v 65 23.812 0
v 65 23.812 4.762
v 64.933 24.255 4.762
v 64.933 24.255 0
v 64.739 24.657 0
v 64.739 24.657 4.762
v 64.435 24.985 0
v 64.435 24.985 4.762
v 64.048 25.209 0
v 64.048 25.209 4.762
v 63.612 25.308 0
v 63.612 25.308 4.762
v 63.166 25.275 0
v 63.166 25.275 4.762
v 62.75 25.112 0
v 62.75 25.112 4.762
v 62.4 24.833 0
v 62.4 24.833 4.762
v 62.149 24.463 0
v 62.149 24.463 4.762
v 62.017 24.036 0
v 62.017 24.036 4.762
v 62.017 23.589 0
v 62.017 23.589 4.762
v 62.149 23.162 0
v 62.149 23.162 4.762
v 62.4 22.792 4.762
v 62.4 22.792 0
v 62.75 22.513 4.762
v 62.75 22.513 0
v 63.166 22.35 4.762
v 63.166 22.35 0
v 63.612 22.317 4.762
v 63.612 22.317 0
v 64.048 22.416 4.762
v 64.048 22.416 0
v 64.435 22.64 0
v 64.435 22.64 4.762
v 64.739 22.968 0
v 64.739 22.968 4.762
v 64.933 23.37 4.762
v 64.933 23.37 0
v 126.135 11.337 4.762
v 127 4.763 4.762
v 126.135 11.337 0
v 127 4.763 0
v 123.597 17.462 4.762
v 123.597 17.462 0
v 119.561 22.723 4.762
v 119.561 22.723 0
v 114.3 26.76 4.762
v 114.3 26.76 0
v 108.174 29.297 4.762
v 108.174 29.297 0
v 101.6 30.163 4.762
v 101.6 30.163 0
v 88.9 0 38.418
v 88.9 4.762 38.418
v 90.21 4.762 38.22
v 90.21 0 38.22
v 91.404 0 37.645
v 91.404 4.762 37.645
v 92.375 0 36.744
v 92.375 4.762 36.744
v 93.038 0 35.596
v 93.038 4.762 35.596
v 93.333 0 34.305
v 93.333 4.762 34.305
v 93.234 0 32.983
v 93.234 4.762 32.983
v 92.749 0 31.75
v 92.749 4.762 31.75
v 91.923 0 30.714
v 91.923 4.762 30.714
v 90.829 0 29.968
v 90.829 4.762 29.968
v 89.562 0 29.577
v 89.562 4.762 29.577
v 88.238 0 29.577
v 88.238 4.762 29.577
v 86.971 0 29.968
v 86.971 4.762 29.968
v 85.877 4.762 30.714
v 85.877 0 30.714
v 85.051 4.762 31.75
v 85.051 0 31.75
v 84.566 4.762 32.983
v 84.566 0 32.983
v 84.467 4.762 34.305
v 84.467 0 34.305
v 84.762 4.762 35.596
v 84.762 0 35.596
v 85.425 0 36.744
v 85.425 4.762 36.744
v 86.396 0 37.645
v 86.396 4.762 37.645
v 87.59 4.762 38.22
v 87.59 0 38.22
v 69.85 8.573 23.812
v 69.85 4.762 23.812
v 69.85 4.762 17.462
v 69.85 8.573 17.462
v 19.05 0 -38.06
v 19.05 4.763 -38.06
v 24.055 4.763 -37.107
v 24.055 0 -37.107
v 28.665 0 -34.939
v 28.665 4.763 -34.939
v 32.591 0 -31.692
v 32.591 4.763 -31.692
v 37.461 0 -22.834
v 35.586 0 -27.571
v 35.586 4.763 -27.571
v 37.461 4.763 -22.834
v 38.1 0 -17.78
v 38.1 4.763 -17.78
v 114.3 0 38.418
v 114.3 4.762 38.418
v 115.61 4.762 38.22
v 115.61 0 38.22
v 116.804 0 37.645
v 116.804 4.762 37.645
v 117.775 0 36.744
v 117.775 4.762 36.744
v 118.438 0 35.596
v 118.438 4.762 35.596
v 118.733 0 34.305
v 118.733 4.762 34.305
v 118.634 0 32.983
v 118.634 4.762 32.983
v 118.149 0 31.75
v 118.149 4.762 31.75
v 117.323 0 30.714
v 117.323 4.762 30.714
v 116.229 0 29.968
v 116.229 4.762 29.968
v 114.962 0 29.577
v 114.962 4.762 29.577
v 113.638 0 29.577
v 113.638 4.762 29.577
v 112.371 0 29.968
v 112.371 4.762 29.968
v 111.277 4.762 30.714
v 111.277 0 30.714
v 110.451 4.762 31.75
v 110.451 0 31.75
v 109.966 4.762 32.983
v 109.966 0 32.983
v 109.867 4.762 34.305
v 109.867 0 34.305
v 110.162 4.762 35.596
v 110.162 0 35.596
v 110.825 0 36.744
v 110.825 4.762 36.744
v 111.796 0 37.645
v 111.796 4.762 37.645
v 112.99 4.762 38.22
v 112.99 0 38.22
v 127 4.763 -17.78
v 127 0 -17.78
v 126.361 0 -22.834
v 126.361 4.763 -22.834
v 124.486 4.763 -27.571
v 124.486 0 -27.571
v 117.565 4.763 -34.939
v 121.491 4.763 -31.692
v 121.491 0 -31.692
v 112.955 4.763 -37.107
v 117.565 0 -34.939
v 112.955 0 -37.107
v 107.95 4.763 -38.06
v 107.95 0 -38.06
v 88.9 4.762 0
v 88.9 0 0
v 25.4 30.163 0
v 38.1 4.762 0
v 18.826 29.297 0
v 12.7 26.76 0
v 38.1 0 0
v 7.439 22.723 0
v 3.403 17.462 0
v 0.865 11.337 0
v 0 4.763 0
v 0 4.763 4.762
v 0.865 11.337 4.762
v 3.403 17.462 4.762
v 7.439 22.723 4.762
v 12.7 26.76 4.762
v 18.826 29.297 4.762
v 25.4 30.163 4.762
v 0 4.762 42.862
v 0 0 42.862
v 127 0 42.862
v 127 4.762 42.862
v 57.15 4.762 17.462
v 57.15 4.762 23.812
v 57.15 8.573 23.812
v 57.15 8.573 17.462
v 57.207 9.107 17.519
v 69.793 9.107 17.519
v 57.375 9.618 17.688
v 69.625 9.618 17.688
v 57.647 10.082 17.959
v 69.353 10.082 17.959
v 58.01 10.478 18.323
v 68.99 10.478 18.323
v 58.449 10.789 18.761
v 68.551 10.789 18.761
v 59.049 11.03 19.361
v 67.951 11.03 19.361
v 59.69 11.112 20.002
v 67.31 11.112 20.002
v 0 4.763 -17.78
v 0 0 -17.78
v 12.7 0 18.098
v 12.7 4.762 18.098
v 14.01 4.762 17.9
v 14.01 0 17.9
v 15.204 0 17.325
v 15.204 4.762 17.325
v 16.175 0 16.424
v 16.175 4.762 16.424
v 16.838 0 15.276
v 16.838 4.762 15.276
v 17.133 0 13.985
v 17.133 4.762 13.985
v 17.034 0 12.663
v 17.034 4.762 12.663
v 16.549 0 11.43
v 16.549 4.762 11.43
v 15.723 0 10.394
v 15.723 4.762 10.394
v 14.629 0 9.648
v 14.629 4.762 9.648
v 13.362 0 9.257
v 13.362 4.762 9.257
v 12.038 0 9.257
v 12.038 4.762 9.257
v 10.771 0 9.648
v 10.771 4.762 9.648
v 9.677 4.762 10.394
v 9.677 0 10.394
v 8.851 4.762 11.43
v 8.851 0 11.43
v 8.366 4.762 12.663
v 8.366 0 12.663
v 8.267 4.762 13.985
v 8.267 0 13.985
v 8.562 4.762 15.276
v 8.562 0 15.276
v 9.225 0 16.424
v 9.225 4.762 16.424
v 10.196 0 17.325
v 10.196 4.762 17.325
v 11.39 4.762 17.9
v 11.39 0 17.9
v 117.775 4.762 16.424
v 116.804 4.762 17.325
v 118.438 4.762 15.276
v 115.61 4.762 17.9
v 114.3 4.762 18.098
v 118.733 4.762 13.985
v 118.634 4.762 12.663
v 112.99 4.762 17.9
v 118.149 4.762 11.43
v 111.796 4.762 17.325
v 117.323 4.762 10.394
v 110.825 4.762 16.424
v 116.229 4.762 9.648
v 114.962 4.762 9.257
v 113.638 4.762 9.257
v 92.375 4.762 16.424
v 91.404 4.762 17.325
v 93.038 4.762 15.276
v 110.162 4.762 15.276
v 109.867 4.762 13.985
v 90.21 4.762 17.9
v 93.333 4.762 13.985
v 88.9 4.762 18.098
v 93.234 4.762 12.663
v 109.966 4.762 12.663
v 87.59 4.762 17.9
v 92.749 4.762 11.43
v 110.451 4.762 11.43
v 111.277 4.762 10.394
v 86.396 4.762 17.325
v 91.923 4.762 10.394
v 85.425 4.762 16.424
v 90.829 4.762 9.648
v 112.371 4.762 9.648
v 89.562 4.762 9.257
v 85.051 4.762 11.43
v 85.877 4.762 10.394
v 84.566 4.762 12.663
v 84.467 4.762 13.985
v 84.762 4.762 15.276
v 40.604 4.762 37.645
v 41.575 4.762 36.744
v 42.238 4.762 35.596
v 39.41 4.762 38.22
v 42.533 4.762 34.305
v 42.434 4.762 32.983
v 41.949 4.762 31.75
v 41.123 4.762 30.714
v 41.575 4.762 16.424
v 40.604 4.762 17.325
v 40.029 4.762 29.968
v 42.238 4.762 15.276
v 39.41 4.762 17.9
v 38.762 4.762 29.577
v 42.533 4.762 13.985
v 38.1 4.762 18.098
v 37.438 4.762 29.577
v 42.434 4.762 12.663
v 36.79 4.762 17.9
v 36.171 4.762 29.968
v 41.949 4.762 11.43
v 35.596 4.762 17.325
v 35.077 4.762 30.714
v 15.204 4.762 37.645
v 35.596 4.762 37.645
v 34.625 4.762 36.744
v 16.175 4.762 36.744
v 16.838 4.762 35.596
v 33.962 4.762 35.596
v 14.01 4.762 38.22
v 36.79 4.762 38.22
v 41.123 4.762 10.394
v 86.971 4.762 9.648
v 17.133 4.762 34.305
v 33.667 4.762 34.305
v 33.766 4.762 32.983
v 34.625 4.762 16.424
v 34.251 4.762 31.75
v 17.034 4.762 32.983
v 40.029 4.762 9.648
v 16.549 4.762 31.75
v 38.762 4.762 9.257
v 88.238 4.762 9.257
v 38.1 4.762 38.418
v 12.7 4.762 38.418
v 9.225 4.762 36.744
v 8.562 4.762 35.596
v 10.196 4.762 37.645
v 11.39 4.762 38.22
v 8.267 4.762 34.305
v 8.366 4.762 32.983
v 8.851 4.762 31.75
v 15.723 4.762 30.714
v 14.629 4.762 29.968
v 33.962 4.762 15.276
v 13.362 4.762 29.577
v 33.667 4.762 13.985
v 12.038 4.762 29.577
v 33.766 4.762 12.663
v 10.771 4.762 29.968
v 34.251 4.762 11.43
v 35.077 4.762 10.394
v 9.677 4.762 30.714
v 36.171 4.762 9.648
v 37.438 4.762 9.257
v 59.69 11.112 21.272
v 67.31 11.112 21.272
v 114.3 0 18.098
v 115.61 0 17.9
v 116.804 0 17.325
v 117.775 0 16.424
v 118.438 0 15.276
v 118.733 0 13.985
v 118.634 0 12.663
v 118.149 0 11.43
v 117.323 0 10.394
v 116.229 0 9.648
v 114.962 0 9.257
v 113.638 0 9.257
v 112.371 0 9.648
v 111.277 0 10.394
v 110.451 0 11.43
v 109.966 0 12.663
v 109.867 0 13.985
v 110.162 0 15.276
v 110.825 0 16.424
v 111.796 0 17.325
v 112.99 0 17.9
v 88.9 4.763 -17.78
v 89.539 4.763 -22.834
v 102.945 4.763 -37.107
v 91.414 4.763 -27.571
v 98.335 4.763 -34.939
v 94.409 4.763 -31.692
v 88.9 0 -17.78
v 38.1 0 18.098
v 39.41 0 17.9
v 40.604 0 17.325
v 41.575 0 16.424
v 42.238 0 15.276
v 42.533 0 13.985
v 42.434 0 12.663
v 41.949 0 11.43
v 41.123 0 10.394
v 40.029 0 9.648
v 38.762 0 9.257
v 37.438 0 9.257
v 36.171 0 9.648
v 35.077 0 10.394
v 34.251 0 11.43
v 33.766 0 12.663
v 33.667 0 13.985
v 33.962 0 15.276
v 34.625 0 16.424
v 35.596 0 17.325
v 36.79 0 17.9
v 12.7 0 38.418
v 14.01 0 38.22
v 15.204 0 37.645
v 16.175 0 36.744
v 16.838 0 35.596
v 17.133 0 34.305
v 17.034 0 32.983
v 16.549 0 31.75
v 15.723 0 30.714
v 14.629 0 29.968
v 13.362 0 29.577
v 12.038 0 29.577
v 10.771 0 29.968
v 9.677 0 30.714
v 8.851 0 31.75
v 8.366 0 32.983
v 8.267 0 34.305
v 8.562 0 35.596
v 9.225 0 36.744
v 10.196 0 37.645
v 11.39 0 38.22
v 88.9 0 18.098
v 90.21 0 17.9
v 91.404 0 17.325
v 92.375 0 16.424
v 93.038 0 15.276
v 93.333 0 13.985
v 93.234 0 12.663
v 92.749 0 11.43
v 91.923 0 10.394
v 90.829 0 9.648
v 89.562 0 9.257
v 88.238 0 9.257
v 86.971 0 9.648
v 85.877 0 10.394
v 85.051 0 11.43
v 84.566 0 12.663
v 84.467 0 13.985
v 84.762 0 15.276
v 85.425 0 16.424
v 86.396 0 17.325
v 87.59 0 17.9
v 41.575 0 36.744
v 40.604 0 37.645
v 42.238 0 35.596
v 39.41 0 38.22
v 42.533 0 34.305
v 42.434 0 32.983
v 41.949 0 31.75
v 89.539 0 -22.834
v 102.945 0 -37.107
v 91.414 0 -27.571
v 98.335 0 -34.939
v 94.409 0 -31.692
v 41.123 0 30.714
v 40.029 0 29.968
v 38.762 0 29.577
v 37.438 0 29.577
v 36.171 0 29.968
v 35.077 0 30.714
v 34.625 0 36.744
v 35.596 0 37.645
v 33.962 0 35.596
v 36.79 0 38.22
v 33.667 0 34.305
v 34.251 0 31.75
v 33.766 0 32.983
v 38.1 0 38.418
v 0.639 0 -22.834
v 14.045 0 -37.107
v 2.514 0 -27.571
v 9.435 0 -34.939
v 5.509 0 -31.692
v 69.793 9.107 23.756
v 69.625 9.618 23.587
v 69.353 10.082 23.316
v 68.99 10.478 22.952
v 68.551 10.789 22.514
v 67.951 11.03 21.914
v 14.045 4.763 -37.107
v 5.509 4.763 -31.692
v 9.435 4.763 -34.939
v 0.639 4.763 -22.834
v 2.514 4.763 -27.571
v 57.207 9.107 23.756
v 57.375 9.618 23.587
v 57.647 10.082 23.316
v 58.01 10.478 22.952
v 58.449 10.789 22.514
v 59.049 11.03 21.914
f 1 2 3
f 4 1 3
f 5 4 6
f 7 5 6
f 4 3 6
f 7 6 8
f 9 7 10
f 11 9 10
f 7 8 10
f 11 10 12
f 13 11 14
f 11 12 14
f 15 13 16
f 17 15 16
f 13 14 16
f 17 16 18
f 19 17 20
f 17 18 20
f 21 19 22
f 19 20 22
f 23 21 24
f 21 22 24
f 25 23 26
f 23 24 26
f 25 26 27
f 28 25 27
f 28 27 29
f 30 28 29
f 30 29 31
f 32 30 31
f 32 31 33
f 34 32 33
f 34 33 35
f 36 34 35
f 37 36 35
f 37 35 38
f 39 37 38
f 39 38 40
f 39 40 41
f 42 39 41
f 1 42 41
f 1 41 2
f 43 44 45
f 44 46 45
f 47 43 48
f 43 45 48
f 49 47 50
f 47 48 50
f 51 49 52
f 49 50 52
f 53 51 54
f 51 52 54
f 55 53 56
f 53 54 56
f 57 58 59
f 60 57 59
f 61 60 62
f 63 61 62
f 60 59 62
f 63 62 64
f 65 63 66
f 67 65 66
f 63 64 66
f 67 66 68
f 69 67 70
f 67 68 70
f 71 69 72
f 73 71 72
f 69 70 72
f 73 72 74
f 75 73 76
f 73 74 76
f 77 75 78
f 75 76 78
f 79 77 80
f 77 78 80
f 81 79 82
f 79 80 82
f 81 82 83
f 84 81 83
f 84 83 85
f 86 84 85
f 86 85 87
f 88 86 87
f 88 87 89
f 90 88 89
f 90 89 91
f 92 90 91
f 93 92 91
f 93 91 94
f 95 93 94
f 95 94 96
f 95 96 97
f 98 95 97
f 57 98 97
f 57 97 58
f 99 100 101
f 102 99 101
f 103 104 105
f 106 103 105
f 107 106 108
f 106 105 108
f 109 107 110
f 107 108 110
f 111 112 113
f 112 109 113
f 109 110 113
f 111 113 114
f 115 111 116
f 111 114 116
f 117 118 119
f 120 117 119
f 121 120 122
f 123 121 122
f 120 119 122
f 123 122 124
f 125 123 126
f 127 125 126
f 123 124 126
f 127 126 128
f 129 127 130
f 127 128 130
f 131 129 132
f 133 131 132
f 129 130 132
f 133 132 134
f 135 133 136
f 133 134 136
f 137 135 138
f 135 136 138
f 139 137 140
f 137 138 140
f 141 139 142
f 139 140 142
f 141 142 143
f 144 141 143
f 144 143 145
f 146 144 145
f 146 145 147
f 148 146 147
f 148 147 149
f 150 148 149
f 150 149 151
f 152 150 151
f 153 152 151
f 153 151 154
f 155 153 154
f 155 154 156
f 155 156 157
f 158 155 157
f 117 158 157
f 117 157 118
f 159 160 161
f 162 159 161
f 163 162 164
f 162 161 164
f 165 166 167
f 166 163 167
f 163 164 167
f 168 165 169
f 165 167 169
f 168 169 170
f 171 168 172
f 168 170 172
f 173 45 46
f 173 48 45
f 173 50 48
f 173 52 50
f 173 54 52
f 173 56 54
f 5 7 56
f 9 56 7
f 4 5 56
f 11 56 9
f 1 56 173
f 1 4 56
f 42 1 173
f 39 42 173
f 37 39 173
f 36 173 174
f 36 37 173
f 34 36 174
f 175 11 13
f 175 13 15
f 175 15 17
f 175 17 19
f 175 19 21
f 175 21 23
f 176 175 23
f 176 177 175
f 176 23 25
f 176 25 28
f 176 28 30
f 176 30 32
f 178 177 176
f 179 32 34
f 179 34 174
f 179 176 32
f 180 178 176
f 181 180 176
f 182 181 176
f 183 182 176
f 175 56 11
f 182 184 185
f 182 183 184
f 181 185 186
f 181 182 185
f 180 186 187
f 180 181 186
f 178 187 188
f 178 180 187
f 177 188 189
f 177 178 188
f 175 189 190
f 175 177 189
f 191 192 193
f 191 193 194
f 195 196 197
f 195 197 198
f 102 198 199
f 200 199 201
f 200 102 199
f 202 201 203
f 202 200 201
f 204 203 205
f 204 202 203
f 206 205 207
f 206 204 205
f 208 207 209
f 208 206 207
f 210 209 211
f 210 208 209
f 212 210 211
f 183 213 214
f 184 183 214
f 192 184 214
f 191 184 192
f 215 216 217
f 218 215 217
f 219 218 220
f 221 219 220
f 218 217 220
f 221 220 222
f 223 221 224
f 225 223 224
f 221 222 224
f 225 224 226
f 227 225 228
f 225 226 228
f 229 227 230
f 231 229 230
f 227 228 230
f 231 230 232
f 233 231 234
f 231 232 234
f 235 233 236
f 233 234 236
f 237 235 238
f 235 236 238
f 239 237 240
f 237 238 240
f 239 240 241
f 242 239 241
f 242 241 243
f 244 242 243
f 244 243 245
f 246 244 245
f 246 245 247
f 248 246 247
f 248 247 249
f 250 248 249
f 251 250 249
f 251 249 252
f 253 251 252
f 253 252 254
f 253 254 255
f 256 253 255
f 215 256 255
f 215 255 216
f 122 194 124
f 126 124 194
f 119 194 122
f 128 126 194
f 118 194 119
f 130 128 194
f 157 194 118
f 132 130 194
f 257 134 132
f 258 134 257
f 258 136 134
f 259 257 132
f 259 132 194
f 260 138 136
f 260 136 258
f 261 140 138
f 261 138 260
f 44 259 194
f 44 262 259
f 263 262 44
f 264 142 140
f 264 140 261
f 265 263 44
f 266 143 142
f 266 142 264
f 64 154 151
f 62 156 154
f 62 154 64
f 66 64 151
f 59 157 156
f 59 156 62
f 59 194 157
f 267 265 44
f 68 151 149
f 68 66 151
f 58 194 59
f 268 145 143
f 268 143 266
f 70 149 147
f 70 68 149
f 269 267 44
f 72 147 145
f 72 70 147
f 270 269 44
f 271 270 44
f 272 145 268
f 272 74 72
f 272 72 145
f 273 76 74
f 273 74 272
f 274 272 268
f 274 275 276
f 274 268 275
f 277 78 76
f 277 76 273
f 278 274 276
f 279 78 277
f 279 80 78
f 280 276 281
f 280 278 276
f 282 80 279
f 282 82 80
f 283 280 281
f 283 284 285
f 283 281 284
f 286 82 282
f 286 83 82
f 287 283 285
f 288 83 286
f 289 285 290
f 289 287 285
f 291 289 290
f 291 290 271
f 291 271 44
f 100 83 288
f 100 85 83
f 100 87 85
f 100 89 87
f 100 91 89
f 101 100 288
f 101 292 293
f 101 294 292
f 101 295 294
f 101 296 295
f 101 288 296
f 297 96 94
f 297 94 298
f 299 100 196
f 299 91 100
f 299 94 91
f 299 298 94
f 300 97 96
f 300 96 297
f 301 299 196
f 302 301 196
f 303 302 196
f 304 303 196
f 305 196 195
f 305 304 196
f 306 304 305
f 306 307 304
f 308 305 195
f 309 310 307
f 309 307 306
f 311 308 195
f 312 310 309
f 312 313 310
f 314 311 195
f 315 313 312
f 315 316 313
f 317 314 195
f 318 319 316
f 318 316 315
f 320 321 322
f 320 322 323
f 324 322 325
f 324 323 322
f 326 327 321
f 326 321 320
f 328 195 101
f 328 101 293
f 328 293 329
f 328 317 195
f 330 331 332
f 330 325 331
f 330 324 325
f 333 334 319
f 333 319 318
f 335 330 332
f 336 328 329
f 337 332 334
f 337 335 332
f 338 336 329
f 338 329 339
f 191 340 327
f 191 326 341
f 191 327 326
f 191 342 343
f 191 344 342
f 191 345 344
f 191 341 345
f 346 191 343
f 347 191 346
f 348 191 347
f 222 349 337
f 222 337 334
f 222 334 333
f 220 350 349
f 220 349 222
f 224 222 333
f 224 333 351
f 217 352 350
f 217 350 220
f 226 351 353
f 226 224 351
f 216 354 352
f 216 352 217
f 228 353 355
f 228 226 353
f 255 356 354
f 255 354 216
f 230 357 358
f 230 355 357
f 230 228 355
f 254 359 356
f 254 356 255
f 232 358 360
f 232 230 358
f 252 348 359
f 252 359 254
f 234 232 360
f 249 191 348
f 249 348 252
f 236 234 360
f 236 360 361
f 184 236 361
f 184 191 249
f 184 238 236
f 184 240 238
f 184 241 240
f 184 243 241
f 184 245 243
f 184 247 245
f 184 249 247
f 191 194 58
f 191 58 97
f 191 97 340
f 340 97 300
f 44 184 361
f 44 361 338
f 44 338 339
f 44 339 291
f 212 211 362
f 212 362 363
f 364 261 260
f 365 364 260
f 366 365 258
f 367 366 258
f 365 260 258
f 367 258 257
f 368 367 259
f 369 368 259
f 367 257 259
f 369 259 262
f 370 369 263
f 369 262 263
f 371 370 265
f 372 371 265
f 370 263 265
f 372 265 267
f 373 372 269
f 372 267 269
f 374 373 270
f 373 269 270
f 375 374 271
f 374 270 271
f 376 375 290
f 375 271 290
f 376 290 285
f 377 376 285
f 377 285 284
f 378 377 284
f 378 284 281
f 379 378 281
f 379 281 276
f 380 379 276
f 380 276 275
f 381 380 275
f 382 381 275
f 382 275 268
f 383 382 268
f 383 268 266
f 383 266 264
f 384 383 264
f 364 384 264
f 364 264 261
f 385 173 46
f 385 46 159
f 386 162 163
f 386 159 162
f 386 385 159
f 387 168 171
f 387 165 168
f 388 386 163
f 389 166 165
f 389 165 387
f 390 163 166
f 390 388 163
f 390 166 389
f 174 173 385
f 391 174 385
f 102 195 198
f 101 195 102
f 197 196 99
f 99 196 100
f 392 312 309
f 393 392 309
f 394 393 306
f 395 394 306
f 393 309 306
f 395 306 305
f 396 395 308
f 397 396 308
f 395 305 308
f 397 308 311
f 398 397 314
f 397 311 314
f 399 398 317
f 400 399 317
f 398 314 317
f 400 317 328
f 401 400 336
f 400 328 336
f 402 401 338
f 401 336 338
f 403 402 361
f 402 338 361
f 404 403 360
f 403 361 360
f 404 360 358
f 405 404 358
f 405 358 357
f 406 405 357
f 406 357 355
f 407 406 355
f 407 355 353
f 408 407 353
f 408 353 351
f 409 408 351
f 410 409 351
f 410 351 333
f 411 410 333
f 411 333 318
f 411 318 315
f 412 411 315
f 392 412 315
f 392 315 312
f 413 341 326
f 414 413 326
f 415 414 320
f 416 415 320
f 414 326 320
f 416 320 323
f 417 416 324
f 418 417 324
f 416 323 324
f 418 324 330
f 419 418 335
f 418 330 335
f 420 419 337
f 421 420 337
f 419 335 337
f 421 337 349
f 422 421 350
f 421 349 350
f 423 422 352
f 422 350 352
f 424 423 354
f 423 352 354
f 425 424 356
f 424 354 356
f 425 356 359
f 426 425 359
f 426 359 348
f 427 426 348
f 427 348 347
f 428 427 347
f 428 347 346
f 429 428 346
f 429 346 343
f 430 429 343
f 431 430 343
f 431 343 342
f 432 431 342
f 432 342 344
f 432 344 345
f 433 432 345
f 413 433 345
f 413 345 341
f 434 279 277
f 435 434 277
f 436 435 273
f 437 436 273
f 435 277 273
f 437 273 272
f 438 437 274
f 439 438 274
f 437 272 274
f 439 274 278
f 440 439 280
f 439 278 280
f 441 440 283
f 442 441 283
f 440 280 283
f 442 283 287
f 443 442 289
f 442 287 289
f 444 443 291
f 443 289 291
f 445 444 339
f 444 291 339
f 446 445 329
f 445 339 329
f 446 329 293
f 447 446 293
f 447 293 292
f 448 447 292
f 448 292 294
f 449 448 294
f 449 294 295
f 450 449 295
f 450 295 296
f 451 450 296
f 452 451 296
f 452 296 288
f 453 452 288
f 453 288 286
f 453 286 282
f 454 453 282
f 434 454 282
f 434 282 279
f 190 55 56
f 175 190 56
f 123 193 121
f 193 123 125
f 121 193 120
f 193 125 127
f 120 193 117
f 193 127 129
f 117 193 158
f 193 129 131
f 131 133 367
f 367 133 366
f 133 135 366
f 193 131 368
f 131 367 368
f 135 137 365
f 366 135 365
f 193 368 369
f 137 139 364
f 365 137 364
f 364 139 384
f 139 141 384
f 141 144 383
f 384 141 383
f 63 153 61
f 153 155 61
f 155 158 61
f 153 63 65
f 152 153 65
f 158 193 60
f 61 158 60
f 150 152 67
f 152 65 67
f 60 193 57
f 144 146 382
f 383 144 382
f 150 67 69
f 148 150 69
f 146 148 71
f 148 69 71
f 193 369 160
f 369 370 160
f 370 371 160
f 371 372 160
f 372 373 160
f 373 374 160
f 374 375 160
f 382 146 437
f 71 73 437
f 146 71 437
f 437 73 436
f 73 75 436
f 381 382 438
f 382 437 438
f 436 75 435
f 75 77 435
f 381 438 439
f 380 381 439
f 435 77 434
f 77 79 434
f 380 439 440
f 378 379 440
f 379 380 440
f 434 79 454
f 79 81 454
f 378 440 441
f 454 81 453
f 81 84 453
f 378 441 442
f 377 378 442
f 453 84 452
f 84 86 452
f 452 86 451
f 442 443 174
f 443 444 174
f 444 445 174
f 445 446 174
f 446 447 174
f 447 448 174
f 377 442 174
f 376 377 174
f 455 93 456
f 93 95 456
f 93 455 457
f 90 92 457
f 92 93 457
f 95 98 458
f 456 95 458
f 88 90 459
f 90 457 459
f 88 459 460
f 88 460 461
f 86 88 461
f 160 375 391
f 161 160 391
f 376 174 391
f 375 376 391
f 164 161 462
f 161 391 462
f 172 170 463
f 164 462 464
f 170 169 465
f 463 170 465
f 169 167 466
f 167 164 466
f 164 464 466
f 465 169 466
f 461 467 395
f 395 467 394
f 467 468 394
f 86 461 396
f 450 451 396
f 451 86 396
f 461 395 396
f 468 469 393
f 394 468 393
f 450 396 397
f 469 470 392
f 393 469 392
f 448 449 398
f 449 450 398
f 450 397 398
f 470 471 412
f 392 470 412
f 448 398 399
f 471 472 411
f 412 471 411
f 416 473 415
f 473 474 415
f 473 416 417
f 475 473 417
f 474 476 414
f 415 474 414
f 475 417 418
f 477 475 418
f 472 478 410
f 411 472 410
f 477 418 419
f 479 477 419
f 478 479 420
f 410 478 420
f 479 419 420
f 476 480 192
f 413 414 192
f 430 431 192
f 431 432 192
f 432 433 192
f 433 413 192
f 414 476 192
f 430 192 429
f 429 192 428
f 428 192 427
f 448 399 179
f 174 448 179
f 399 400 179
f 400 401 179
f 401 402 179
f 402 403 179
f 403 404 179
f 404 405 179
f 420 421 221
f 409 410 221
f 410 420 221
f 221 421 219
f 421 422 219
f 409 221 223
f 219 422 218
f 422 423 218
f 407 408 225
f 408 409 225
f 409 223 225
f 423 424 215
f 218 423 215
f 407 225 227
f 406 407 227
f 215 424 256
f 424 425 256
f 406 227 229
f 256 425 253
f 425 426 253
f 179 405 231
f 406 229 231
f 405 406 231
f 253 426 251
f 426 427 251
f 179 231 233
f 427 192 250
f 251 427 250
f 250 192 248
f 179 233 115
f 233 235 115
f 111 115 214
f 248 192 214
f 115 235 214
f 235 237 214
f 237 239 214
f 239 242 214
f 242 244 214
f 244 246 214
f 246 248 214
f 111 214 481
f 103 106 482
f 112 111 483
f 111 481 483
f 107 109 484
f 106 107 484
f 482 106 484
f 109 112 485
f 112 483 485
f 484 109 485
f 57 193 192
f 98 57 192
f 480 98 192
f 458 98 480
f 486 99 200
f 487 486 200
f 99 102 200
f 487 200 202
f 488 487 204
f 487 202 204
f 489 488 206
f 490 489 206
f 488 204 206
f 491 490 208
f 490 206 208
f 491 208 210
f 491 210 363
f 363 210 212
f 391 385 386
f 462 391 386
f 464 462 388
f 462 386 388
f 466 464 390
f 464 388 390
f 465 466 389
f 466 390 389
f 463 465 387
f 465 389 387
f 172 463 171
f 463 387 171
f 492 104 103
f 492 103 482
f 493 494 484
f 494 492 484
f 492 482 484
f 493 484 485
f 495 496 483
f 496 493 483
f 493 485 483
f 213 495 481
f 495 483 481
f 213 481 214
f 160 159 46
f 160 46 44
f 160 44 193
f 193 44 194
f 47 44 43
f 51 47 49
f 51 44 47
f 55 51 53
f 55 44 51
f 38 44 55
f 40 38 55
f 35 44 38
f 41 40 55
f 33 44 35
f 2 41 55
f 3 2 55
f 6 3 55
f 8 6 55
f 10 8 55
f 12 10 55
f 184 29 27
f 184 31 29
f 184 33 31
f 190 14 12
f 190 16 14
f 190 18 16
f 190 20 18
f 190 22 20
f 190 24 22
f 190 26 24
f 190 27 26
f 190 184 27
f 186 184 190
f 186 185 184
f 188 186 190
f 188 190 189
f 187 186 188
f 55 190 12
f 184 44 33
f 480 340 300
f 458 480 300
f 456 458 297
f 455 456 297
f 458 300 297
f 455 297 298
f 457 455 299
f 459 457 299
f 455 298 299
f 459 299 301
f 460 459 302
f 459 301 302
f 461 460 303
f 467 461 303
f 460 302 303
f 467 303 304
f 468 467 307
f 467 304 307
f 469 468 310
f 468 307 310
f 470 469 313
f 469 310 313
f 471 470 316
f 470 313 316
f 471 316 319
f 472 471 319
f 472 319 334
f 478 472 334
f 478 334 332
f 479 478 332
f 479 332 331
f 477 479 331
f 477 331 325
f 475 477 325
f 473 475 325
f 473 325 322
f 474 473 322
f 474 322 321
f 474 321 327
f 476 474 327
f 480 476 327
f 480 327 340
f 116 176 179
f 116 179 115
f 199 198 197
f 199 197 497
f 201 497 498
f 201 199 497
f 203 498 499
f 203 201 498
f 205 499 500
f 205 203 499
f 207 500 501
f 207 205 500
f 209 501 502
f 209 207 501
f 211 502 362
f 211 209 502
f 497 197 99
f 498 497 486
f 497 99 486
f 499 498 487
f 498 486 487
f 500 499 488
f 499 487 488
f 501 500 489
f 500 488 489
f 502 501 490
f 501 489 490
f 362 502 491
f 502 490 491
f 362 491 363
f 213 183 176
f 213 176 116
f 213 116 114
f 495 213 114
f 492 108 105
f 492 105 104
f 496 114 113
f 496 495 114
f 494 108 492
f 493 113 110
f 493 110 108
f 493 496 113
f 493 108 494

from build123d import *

# Parameters (mm, degrees)
SKETCH1_W           = 38.1
SKETCH1_H           = 4.7625
BOSS_EXTRUDE1_DEPTH = 127
SKETCH2_W           = 12.7
SKETCH2_H           = 6.35
BOSS_EXTRUDE2_DEPTH = 6.35
SKETCH3_R           = 1.499997
CUT_EXTRUDE1_DEPTH  = 138.389847924
FILLET1_R           = 2.54
SKETCH4_W           = 50.8
SKETCH4_H           = 38.1
CUT_EXTRUDE2_DEPTH  = 137.423436059
FILLET2_R           = 20.32
SKETCH5_R           = 4.445
CUT_EXTRUDE3_DEPTH  = 137.423436059
FILLET3_R           = 25.4


with BuildPart() as part:
    # Sketch1 → Boss-Extrude1 (new body)
    with BuildSketch(Plane(origin=(0, 0, 0), x_dir=(0, 0, -1), z_dir=(1, 0, 0))):
        Polygon((0, 30.1625), (0, 0), (-42.8625, 0), (-42.8625, 4.7625), (-4.7625, 4.7625), (-4.7625, 30.1625), align=None)
        with Locations((19.05, 2.38125)):
            Rectangle(SKETCH1_W, SKETCH1_H)
    extrude(amount=BOSS_EXTRUDE1_DEPTH)

    # Sketch2 → Boss-Extrude2 (add)
    with BuildSketch(Plane(origin=(0, 4.7625, 0), x_dir=(1, 0, 0), z_dir=(0, 1, 0))):
        with Locations((63.5, -20.6375)):
            Rectangle(SKETCH2_W, SKETCH2_H)
    extrude(amount=BOSS_EXTRUDE2_DEPTH)

    # Sketch3 → Cut-Extrude1 (cut, through all)
    with BuildSketch(Plane.XY.offset(4.7625)):
        with Locations((63.5, 23.8125)):
            Circle(SKETCH3_R)
    extrude(amount=-CUT_EXTRUDE1_DEPTH, mode=Mode.SUBTRACT)

    # Fillet1
    fillet1_edges = [part.edges().sort_by_distance(p)[0] for p in [
        (57.15, 11.1125, 20.6375),
        (63.5, 11.1125, 23.8125),
        (69.85, 11.1125, 20.6375),
        (63.5, 11.1125, 17.4625),
    ]]
    fillet(fillet1_edges, radius=FILLET1_R)

    # Sketch4 → Cut-Extrude2 (cut, through all)
    with BuildSketch(Plane(origin=(0, 4.7625, 0), x_dir=(1, 0, 0), z_dir=(0, 1, 0))):
        with Locations((63.5, 19.05)):
            Rectangle(SKETCH4_W, SKETCH4_H)
    extrude(amount=-CUT_EXTRUDE2_DEPTH, mode=Mode.SUBTRACT)

    # Fillet2
    # the kernel refuses this fillet: 20.32 mm, written as the material it takes off along each edge
    with BuildSketch(Plane(origin=(0, -50.8, -38.1), x_dir=(0, 0, 1), z_dir=(0, 1, 0)), Plane(origin=(88.9, 55.5625, -38.1), x_dir=(1, 0, 0), z_dir=(0, -1, 0))) as fillet2_piece_1:
        with BuildLine():
            CenterArc((FILLET2_R, FILLET2_R), FILLET2_R, 180, 90)
            Line((0, FILLET2_R), (0, 0))
            Line((0, 0), (FILLET2_R, 0))
        make_face()
    extrude(amount=106.3625, mode=Mode.SUBTRACT)
    with BuildSketch(Plane(origin=(38.1, 55.5625, -38.1), x_dir=(-1, 0, 0), z_dir=(0, -1, 0)), Plane(origin=(127, -50.8, -38.1), x_dir=(0, 0, 1), z_dir=(0, 1, 0))) as fillet2_piece_2:
        with BuildLine():
            CenterArc((FILLET2_R, -FILLET2_R), FILLET2_R, 90, 90)
            Line((0, -FILLET2_R), (0, 0))
            Line((0, 0), (FILLET2_R, 0))
        make_face()
    extrude(amount=106.3625, mode=Mode.SUBTRACT)

    # Sketch5 → Cut-Extrude3 (cut, through all)
    with BuildSketch(Plane(origin=(0, 4.7625, 0), x_dir=(1, 0, 0), z_dir=(0, 1, 0))):
        with Locations(Location((12.7, -13.6525, 0), (0, 0, 270))):
            Circle(SKETCH5_R)
        with Locations(Location((12.7, -33.9725, 0), (0, 0, 270))):
            Circle(SKETCH5_R)
        with Locations(Location((114.3, -13.6525, 0), (0, 0, 270))):
            Circle(SKETCH5_R)
        with Locations(Location((114.3, -33.9725, 0), (0, 0, 270))):
            Circle(SKETCH5_R)
        with Locations(Location((38.1, -13.6525, 0), (0, 0, 270))):
            Circle(SKETCH5_R)
        with Locations(Location((88.9, -13.6525, 0), (0, 0, 270))):
            Circle(SKETCH5_R)
        with Locations(Location((38.1, -33.9725, 0), (0, 0, 270))):
            Circle(SKETCH5_R)
        with Locations(Location((88.9, -33.9725, 0), (0, 0, 270))):
            Circle(SKETCH5_R)
    extrude(amount=-CUT_EXTRUDE3_DEPTH, mode=Mode.SUBTRACT)

    # Fillet3
    fillet3_edges = [part.edges().sort_by_distance(p)[0] for p in [
        (127, 30.1625, 2.38125),
        (0, 30.1625, 2.38125),
    ]]
    fillet(fillet3_edges, radius=FILLET3_R)


solid = part.part
